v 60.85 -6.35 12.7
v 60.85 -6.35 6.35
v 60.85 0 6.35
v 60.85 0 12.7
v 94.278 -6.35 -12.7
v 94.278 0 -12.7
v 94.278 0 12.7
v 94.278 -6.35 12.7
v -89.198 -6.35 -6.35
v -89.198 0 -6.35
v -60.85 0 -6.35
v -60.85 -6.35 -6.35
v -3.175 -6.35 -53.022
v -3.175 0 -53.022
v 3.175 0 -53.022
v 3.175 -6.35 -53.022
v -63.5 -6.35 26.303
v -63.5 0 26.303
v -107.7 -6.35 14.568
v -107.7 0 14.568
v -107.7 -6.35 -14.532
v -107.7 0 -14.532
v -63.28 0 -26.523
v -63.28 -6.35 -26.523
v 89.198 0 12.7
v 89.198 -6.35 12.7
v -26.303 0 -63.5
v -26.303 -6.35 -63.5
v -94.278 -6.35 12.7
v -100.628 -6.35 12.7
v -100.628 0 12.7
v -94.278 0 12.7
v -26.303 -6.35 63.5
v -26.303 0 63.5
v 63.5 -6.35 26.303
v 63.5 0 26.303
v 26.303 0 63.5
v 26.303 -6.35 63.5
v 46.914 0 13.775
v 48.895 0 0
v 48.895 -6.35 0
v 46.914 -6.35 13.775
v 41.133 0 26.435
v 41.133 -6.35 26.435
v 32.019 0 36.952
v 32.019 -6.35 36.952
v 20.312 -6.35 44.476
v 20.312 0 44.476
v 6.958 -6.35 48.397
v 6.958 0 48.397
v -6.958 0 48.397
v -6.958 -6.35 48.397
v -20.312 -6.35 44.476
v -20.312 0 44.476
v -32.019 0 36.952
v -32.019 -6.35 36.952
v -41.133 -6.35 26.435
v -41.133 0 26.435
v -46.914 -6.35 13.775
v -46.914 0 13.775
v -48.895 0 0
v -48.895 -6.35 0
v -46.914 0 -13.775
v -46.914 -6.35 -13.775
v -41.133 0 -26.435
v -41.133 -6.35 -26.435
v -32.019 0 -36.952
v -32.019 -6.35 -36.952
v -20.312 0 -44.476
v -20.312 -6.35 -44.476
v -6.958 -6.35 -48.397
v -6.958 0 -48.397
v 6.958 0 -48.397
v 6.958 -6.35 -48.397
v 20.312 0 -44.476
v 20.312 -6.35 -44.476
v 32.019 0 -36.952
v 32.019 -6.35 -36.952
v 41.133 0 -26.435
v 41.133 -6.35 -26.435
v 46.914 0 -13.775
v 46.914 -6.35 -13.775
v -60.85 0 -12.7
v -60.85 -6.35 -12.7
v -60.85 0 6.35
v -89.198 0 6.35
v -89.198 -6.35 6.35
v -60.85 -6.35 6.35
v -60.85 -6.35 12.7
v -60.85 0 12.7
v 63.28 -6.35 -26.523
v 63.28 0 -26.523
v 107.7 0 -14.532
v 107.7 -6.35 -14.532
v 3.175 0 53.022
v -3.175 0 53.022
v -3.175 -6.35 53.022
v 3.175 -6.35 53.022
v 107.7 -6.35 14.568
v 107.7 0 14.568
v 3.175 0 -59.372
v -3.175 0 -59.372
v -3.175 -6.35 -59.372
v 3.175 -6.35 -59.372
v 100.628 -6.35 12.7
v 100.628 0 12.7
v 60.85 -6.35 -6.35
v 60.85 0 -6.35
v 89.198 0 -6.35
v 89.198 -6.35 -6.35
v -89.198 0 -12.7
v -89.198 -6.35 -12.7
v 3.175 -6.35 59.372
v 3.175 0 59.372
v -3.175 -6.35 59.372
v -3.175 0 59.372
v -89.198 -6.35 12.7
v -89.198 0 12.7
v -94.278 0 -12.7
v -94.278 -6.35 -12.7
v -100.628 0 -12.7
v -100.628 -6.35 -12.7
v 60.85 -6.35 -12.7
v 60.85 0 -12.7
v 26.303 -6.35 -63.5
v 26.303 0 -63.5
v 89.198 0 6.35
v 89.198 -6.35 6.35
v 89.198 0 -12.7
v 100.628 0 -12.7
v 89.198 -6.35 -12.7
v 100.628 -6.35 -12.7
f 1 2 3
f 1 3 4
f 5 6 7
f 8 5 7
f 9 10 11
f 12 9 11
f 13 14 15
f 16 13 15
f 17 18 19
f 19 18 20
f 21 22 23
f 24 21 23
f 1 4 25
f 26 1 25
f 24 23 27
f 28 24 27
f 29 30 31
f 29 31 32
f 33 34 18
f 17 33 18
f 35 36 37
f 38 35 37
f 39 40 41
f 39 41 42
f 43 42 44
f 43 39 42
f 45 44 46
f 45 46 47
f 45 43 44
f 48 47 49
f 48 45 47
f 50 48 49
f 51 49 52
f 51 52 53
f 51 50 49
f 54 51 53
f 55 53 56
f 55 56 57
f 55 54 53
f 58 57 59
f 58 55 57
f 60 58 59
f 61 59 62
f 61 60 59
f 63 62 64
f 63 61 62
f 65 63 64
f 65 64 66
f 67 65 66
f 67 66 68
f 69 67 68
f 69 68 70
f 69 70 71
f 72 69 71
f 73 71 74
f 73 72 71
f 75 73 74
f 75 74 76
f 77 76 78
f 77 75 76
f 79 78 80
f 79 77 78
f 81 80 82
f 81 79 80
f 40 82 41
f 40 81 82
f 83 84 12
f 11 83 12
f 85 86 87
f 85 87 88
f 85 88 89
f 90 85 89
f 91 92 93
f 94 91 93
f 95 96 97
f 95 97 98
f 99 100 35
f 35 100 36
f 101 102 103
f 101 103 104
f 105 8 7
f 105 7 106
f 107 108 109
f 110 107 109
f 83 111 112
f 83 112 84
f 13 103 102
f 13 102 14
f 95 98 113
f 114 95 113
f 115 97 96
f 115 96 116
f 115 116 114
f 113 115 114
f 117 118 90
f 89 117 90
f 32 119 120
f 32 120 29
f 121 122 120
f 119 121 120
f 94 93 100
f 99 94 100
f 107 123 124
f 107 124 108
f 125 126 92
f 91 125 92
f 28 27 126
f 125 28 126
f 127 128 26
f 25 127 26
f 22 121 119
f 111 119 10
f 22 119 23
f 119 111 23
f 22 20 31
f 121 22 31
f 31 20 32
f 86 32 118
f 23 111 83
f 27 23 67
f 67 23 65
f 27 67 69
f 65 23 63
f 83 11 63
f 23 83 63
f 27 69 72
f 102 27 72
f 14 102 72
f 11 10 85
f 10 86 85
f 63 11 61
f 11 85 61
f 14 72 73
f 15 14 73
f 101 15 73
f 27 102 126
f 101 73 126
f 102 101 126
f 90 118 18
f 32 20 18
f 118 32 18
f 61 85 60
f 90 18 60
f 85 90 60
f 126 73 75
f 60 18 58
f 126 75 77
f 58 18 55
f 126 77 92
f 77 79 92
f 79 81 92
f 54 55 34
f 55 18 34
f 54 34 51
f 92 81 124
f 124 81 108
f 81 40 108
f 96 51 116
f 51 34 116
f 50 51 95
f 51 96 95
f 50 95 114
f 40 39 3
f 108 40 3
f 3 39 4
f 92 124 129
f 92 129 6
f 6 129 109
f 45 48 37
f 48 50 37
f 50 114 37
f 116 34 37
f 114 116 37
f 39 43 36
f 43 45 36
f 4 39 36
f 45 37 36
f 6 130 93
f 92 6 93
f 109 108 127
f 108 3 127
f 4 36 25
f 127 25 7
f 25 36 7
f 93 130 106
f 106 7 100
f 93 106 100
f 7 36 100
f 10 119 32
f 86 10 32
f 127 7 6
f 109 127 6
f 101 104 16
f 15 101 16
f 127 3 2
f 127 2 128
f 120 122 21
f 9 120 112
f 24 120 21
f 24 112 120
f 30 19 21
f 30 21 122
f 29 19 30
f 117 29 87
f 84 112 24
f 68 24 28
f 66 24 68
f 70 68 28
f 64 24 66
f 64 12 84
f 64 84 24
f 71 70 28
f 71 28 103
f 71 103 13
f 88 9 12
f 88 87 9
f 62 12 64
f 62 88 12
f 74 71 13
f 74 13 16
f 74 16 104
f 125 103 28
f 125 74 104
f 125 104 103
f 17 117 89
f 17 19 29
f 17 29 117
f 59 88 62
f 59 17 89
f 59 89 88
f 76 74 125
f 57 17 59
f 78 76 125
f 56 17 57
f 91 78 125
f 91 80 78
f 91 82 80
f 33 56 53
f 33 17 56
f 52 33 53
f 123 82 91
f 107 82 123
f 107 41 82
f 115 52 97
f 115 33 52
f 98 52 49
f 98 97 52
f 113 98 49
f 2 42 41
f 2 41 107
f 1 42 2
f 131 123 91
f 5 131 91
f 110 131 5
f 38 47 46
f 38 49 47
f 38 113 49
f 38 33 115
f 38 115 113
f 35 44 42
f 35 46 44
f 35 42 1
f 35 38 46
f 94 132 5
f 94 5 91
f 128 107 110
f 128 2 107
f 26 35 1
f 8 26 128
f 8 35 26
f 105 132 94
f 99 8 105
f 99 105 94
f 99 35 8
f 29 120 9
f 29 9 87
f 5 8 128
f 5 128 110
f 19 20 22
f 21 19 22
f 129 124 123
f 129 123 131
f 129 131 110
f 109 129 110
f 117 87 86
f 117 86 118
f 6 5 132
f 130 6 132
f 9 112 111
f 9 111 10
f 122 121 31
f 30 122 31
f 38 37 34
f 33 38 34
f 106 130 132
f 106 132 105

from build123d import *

# Parameters (mm, degrees)
F0_W     = 28.348149
F0_H     = 6.35
F0_W_2   = 6.35
F0_H_2   = 25.4
F0_R     = 48.895
F1_DEPTH = 6.35


with BuildPart() as f1:
    # F0 (on Front) → F1 (new body)
    with BuildSketch(Plane.XZ):
        Polygon((26.302561, 63.5), (-26.302561, 63.5), (-63.5, 26.302561), (-107.699501, 14.567526), (-107.699501, -14.531948), (-63.279638, -26.522923), (-26.302561, -63.5), (26.302561, -63.5), (63.279638, -26.522923), (107.699501, -14.531948), (107.699501, 14.567526), (63.5, 26.302561), align=None)
        with Locations((-75.024232, -9.525)):
            Rectangle(F0_W, F0_H, mode=Mode.SUBTRACT)
        with Locations((0, -56.1975)):
            Rectangle(F0_W_2, F0_H, mode=Mode.SUBTRACT)
        with Locations((75.024232, -9.525)):
            Rectangle(F0_W, F0_H, mode=Mode.SUBTRACT)
        with Locations((-97.453307, 0)):
            Rectangle(F0_W_2, F0_H_2, mode=Mode.SUBTRACT)
        with Locations((-75.024232, 9.525)):
            Rectangle(F0_W, F0_H, mode=Mode.SUBTRACT)
        Circle(F0_R, mode=Mode.SUBTRACT)
        with Locations((75.024232, 9.525)):
            Rectangle(F0_W, F0_H, mode=Mode.SUBTRACT)
        with Locations((97.453307, 0)):
            Rectangle(F0_W_2, F0_H_2, mode=Mode.SUBTRACT)
        with Locations((0, 56.1975)):
            Rectangle(F0_W_2, F0_H, mode=Mode.SUBTRACT)
    extrude(amount=F1_DEPTH)


solid = f1.part
